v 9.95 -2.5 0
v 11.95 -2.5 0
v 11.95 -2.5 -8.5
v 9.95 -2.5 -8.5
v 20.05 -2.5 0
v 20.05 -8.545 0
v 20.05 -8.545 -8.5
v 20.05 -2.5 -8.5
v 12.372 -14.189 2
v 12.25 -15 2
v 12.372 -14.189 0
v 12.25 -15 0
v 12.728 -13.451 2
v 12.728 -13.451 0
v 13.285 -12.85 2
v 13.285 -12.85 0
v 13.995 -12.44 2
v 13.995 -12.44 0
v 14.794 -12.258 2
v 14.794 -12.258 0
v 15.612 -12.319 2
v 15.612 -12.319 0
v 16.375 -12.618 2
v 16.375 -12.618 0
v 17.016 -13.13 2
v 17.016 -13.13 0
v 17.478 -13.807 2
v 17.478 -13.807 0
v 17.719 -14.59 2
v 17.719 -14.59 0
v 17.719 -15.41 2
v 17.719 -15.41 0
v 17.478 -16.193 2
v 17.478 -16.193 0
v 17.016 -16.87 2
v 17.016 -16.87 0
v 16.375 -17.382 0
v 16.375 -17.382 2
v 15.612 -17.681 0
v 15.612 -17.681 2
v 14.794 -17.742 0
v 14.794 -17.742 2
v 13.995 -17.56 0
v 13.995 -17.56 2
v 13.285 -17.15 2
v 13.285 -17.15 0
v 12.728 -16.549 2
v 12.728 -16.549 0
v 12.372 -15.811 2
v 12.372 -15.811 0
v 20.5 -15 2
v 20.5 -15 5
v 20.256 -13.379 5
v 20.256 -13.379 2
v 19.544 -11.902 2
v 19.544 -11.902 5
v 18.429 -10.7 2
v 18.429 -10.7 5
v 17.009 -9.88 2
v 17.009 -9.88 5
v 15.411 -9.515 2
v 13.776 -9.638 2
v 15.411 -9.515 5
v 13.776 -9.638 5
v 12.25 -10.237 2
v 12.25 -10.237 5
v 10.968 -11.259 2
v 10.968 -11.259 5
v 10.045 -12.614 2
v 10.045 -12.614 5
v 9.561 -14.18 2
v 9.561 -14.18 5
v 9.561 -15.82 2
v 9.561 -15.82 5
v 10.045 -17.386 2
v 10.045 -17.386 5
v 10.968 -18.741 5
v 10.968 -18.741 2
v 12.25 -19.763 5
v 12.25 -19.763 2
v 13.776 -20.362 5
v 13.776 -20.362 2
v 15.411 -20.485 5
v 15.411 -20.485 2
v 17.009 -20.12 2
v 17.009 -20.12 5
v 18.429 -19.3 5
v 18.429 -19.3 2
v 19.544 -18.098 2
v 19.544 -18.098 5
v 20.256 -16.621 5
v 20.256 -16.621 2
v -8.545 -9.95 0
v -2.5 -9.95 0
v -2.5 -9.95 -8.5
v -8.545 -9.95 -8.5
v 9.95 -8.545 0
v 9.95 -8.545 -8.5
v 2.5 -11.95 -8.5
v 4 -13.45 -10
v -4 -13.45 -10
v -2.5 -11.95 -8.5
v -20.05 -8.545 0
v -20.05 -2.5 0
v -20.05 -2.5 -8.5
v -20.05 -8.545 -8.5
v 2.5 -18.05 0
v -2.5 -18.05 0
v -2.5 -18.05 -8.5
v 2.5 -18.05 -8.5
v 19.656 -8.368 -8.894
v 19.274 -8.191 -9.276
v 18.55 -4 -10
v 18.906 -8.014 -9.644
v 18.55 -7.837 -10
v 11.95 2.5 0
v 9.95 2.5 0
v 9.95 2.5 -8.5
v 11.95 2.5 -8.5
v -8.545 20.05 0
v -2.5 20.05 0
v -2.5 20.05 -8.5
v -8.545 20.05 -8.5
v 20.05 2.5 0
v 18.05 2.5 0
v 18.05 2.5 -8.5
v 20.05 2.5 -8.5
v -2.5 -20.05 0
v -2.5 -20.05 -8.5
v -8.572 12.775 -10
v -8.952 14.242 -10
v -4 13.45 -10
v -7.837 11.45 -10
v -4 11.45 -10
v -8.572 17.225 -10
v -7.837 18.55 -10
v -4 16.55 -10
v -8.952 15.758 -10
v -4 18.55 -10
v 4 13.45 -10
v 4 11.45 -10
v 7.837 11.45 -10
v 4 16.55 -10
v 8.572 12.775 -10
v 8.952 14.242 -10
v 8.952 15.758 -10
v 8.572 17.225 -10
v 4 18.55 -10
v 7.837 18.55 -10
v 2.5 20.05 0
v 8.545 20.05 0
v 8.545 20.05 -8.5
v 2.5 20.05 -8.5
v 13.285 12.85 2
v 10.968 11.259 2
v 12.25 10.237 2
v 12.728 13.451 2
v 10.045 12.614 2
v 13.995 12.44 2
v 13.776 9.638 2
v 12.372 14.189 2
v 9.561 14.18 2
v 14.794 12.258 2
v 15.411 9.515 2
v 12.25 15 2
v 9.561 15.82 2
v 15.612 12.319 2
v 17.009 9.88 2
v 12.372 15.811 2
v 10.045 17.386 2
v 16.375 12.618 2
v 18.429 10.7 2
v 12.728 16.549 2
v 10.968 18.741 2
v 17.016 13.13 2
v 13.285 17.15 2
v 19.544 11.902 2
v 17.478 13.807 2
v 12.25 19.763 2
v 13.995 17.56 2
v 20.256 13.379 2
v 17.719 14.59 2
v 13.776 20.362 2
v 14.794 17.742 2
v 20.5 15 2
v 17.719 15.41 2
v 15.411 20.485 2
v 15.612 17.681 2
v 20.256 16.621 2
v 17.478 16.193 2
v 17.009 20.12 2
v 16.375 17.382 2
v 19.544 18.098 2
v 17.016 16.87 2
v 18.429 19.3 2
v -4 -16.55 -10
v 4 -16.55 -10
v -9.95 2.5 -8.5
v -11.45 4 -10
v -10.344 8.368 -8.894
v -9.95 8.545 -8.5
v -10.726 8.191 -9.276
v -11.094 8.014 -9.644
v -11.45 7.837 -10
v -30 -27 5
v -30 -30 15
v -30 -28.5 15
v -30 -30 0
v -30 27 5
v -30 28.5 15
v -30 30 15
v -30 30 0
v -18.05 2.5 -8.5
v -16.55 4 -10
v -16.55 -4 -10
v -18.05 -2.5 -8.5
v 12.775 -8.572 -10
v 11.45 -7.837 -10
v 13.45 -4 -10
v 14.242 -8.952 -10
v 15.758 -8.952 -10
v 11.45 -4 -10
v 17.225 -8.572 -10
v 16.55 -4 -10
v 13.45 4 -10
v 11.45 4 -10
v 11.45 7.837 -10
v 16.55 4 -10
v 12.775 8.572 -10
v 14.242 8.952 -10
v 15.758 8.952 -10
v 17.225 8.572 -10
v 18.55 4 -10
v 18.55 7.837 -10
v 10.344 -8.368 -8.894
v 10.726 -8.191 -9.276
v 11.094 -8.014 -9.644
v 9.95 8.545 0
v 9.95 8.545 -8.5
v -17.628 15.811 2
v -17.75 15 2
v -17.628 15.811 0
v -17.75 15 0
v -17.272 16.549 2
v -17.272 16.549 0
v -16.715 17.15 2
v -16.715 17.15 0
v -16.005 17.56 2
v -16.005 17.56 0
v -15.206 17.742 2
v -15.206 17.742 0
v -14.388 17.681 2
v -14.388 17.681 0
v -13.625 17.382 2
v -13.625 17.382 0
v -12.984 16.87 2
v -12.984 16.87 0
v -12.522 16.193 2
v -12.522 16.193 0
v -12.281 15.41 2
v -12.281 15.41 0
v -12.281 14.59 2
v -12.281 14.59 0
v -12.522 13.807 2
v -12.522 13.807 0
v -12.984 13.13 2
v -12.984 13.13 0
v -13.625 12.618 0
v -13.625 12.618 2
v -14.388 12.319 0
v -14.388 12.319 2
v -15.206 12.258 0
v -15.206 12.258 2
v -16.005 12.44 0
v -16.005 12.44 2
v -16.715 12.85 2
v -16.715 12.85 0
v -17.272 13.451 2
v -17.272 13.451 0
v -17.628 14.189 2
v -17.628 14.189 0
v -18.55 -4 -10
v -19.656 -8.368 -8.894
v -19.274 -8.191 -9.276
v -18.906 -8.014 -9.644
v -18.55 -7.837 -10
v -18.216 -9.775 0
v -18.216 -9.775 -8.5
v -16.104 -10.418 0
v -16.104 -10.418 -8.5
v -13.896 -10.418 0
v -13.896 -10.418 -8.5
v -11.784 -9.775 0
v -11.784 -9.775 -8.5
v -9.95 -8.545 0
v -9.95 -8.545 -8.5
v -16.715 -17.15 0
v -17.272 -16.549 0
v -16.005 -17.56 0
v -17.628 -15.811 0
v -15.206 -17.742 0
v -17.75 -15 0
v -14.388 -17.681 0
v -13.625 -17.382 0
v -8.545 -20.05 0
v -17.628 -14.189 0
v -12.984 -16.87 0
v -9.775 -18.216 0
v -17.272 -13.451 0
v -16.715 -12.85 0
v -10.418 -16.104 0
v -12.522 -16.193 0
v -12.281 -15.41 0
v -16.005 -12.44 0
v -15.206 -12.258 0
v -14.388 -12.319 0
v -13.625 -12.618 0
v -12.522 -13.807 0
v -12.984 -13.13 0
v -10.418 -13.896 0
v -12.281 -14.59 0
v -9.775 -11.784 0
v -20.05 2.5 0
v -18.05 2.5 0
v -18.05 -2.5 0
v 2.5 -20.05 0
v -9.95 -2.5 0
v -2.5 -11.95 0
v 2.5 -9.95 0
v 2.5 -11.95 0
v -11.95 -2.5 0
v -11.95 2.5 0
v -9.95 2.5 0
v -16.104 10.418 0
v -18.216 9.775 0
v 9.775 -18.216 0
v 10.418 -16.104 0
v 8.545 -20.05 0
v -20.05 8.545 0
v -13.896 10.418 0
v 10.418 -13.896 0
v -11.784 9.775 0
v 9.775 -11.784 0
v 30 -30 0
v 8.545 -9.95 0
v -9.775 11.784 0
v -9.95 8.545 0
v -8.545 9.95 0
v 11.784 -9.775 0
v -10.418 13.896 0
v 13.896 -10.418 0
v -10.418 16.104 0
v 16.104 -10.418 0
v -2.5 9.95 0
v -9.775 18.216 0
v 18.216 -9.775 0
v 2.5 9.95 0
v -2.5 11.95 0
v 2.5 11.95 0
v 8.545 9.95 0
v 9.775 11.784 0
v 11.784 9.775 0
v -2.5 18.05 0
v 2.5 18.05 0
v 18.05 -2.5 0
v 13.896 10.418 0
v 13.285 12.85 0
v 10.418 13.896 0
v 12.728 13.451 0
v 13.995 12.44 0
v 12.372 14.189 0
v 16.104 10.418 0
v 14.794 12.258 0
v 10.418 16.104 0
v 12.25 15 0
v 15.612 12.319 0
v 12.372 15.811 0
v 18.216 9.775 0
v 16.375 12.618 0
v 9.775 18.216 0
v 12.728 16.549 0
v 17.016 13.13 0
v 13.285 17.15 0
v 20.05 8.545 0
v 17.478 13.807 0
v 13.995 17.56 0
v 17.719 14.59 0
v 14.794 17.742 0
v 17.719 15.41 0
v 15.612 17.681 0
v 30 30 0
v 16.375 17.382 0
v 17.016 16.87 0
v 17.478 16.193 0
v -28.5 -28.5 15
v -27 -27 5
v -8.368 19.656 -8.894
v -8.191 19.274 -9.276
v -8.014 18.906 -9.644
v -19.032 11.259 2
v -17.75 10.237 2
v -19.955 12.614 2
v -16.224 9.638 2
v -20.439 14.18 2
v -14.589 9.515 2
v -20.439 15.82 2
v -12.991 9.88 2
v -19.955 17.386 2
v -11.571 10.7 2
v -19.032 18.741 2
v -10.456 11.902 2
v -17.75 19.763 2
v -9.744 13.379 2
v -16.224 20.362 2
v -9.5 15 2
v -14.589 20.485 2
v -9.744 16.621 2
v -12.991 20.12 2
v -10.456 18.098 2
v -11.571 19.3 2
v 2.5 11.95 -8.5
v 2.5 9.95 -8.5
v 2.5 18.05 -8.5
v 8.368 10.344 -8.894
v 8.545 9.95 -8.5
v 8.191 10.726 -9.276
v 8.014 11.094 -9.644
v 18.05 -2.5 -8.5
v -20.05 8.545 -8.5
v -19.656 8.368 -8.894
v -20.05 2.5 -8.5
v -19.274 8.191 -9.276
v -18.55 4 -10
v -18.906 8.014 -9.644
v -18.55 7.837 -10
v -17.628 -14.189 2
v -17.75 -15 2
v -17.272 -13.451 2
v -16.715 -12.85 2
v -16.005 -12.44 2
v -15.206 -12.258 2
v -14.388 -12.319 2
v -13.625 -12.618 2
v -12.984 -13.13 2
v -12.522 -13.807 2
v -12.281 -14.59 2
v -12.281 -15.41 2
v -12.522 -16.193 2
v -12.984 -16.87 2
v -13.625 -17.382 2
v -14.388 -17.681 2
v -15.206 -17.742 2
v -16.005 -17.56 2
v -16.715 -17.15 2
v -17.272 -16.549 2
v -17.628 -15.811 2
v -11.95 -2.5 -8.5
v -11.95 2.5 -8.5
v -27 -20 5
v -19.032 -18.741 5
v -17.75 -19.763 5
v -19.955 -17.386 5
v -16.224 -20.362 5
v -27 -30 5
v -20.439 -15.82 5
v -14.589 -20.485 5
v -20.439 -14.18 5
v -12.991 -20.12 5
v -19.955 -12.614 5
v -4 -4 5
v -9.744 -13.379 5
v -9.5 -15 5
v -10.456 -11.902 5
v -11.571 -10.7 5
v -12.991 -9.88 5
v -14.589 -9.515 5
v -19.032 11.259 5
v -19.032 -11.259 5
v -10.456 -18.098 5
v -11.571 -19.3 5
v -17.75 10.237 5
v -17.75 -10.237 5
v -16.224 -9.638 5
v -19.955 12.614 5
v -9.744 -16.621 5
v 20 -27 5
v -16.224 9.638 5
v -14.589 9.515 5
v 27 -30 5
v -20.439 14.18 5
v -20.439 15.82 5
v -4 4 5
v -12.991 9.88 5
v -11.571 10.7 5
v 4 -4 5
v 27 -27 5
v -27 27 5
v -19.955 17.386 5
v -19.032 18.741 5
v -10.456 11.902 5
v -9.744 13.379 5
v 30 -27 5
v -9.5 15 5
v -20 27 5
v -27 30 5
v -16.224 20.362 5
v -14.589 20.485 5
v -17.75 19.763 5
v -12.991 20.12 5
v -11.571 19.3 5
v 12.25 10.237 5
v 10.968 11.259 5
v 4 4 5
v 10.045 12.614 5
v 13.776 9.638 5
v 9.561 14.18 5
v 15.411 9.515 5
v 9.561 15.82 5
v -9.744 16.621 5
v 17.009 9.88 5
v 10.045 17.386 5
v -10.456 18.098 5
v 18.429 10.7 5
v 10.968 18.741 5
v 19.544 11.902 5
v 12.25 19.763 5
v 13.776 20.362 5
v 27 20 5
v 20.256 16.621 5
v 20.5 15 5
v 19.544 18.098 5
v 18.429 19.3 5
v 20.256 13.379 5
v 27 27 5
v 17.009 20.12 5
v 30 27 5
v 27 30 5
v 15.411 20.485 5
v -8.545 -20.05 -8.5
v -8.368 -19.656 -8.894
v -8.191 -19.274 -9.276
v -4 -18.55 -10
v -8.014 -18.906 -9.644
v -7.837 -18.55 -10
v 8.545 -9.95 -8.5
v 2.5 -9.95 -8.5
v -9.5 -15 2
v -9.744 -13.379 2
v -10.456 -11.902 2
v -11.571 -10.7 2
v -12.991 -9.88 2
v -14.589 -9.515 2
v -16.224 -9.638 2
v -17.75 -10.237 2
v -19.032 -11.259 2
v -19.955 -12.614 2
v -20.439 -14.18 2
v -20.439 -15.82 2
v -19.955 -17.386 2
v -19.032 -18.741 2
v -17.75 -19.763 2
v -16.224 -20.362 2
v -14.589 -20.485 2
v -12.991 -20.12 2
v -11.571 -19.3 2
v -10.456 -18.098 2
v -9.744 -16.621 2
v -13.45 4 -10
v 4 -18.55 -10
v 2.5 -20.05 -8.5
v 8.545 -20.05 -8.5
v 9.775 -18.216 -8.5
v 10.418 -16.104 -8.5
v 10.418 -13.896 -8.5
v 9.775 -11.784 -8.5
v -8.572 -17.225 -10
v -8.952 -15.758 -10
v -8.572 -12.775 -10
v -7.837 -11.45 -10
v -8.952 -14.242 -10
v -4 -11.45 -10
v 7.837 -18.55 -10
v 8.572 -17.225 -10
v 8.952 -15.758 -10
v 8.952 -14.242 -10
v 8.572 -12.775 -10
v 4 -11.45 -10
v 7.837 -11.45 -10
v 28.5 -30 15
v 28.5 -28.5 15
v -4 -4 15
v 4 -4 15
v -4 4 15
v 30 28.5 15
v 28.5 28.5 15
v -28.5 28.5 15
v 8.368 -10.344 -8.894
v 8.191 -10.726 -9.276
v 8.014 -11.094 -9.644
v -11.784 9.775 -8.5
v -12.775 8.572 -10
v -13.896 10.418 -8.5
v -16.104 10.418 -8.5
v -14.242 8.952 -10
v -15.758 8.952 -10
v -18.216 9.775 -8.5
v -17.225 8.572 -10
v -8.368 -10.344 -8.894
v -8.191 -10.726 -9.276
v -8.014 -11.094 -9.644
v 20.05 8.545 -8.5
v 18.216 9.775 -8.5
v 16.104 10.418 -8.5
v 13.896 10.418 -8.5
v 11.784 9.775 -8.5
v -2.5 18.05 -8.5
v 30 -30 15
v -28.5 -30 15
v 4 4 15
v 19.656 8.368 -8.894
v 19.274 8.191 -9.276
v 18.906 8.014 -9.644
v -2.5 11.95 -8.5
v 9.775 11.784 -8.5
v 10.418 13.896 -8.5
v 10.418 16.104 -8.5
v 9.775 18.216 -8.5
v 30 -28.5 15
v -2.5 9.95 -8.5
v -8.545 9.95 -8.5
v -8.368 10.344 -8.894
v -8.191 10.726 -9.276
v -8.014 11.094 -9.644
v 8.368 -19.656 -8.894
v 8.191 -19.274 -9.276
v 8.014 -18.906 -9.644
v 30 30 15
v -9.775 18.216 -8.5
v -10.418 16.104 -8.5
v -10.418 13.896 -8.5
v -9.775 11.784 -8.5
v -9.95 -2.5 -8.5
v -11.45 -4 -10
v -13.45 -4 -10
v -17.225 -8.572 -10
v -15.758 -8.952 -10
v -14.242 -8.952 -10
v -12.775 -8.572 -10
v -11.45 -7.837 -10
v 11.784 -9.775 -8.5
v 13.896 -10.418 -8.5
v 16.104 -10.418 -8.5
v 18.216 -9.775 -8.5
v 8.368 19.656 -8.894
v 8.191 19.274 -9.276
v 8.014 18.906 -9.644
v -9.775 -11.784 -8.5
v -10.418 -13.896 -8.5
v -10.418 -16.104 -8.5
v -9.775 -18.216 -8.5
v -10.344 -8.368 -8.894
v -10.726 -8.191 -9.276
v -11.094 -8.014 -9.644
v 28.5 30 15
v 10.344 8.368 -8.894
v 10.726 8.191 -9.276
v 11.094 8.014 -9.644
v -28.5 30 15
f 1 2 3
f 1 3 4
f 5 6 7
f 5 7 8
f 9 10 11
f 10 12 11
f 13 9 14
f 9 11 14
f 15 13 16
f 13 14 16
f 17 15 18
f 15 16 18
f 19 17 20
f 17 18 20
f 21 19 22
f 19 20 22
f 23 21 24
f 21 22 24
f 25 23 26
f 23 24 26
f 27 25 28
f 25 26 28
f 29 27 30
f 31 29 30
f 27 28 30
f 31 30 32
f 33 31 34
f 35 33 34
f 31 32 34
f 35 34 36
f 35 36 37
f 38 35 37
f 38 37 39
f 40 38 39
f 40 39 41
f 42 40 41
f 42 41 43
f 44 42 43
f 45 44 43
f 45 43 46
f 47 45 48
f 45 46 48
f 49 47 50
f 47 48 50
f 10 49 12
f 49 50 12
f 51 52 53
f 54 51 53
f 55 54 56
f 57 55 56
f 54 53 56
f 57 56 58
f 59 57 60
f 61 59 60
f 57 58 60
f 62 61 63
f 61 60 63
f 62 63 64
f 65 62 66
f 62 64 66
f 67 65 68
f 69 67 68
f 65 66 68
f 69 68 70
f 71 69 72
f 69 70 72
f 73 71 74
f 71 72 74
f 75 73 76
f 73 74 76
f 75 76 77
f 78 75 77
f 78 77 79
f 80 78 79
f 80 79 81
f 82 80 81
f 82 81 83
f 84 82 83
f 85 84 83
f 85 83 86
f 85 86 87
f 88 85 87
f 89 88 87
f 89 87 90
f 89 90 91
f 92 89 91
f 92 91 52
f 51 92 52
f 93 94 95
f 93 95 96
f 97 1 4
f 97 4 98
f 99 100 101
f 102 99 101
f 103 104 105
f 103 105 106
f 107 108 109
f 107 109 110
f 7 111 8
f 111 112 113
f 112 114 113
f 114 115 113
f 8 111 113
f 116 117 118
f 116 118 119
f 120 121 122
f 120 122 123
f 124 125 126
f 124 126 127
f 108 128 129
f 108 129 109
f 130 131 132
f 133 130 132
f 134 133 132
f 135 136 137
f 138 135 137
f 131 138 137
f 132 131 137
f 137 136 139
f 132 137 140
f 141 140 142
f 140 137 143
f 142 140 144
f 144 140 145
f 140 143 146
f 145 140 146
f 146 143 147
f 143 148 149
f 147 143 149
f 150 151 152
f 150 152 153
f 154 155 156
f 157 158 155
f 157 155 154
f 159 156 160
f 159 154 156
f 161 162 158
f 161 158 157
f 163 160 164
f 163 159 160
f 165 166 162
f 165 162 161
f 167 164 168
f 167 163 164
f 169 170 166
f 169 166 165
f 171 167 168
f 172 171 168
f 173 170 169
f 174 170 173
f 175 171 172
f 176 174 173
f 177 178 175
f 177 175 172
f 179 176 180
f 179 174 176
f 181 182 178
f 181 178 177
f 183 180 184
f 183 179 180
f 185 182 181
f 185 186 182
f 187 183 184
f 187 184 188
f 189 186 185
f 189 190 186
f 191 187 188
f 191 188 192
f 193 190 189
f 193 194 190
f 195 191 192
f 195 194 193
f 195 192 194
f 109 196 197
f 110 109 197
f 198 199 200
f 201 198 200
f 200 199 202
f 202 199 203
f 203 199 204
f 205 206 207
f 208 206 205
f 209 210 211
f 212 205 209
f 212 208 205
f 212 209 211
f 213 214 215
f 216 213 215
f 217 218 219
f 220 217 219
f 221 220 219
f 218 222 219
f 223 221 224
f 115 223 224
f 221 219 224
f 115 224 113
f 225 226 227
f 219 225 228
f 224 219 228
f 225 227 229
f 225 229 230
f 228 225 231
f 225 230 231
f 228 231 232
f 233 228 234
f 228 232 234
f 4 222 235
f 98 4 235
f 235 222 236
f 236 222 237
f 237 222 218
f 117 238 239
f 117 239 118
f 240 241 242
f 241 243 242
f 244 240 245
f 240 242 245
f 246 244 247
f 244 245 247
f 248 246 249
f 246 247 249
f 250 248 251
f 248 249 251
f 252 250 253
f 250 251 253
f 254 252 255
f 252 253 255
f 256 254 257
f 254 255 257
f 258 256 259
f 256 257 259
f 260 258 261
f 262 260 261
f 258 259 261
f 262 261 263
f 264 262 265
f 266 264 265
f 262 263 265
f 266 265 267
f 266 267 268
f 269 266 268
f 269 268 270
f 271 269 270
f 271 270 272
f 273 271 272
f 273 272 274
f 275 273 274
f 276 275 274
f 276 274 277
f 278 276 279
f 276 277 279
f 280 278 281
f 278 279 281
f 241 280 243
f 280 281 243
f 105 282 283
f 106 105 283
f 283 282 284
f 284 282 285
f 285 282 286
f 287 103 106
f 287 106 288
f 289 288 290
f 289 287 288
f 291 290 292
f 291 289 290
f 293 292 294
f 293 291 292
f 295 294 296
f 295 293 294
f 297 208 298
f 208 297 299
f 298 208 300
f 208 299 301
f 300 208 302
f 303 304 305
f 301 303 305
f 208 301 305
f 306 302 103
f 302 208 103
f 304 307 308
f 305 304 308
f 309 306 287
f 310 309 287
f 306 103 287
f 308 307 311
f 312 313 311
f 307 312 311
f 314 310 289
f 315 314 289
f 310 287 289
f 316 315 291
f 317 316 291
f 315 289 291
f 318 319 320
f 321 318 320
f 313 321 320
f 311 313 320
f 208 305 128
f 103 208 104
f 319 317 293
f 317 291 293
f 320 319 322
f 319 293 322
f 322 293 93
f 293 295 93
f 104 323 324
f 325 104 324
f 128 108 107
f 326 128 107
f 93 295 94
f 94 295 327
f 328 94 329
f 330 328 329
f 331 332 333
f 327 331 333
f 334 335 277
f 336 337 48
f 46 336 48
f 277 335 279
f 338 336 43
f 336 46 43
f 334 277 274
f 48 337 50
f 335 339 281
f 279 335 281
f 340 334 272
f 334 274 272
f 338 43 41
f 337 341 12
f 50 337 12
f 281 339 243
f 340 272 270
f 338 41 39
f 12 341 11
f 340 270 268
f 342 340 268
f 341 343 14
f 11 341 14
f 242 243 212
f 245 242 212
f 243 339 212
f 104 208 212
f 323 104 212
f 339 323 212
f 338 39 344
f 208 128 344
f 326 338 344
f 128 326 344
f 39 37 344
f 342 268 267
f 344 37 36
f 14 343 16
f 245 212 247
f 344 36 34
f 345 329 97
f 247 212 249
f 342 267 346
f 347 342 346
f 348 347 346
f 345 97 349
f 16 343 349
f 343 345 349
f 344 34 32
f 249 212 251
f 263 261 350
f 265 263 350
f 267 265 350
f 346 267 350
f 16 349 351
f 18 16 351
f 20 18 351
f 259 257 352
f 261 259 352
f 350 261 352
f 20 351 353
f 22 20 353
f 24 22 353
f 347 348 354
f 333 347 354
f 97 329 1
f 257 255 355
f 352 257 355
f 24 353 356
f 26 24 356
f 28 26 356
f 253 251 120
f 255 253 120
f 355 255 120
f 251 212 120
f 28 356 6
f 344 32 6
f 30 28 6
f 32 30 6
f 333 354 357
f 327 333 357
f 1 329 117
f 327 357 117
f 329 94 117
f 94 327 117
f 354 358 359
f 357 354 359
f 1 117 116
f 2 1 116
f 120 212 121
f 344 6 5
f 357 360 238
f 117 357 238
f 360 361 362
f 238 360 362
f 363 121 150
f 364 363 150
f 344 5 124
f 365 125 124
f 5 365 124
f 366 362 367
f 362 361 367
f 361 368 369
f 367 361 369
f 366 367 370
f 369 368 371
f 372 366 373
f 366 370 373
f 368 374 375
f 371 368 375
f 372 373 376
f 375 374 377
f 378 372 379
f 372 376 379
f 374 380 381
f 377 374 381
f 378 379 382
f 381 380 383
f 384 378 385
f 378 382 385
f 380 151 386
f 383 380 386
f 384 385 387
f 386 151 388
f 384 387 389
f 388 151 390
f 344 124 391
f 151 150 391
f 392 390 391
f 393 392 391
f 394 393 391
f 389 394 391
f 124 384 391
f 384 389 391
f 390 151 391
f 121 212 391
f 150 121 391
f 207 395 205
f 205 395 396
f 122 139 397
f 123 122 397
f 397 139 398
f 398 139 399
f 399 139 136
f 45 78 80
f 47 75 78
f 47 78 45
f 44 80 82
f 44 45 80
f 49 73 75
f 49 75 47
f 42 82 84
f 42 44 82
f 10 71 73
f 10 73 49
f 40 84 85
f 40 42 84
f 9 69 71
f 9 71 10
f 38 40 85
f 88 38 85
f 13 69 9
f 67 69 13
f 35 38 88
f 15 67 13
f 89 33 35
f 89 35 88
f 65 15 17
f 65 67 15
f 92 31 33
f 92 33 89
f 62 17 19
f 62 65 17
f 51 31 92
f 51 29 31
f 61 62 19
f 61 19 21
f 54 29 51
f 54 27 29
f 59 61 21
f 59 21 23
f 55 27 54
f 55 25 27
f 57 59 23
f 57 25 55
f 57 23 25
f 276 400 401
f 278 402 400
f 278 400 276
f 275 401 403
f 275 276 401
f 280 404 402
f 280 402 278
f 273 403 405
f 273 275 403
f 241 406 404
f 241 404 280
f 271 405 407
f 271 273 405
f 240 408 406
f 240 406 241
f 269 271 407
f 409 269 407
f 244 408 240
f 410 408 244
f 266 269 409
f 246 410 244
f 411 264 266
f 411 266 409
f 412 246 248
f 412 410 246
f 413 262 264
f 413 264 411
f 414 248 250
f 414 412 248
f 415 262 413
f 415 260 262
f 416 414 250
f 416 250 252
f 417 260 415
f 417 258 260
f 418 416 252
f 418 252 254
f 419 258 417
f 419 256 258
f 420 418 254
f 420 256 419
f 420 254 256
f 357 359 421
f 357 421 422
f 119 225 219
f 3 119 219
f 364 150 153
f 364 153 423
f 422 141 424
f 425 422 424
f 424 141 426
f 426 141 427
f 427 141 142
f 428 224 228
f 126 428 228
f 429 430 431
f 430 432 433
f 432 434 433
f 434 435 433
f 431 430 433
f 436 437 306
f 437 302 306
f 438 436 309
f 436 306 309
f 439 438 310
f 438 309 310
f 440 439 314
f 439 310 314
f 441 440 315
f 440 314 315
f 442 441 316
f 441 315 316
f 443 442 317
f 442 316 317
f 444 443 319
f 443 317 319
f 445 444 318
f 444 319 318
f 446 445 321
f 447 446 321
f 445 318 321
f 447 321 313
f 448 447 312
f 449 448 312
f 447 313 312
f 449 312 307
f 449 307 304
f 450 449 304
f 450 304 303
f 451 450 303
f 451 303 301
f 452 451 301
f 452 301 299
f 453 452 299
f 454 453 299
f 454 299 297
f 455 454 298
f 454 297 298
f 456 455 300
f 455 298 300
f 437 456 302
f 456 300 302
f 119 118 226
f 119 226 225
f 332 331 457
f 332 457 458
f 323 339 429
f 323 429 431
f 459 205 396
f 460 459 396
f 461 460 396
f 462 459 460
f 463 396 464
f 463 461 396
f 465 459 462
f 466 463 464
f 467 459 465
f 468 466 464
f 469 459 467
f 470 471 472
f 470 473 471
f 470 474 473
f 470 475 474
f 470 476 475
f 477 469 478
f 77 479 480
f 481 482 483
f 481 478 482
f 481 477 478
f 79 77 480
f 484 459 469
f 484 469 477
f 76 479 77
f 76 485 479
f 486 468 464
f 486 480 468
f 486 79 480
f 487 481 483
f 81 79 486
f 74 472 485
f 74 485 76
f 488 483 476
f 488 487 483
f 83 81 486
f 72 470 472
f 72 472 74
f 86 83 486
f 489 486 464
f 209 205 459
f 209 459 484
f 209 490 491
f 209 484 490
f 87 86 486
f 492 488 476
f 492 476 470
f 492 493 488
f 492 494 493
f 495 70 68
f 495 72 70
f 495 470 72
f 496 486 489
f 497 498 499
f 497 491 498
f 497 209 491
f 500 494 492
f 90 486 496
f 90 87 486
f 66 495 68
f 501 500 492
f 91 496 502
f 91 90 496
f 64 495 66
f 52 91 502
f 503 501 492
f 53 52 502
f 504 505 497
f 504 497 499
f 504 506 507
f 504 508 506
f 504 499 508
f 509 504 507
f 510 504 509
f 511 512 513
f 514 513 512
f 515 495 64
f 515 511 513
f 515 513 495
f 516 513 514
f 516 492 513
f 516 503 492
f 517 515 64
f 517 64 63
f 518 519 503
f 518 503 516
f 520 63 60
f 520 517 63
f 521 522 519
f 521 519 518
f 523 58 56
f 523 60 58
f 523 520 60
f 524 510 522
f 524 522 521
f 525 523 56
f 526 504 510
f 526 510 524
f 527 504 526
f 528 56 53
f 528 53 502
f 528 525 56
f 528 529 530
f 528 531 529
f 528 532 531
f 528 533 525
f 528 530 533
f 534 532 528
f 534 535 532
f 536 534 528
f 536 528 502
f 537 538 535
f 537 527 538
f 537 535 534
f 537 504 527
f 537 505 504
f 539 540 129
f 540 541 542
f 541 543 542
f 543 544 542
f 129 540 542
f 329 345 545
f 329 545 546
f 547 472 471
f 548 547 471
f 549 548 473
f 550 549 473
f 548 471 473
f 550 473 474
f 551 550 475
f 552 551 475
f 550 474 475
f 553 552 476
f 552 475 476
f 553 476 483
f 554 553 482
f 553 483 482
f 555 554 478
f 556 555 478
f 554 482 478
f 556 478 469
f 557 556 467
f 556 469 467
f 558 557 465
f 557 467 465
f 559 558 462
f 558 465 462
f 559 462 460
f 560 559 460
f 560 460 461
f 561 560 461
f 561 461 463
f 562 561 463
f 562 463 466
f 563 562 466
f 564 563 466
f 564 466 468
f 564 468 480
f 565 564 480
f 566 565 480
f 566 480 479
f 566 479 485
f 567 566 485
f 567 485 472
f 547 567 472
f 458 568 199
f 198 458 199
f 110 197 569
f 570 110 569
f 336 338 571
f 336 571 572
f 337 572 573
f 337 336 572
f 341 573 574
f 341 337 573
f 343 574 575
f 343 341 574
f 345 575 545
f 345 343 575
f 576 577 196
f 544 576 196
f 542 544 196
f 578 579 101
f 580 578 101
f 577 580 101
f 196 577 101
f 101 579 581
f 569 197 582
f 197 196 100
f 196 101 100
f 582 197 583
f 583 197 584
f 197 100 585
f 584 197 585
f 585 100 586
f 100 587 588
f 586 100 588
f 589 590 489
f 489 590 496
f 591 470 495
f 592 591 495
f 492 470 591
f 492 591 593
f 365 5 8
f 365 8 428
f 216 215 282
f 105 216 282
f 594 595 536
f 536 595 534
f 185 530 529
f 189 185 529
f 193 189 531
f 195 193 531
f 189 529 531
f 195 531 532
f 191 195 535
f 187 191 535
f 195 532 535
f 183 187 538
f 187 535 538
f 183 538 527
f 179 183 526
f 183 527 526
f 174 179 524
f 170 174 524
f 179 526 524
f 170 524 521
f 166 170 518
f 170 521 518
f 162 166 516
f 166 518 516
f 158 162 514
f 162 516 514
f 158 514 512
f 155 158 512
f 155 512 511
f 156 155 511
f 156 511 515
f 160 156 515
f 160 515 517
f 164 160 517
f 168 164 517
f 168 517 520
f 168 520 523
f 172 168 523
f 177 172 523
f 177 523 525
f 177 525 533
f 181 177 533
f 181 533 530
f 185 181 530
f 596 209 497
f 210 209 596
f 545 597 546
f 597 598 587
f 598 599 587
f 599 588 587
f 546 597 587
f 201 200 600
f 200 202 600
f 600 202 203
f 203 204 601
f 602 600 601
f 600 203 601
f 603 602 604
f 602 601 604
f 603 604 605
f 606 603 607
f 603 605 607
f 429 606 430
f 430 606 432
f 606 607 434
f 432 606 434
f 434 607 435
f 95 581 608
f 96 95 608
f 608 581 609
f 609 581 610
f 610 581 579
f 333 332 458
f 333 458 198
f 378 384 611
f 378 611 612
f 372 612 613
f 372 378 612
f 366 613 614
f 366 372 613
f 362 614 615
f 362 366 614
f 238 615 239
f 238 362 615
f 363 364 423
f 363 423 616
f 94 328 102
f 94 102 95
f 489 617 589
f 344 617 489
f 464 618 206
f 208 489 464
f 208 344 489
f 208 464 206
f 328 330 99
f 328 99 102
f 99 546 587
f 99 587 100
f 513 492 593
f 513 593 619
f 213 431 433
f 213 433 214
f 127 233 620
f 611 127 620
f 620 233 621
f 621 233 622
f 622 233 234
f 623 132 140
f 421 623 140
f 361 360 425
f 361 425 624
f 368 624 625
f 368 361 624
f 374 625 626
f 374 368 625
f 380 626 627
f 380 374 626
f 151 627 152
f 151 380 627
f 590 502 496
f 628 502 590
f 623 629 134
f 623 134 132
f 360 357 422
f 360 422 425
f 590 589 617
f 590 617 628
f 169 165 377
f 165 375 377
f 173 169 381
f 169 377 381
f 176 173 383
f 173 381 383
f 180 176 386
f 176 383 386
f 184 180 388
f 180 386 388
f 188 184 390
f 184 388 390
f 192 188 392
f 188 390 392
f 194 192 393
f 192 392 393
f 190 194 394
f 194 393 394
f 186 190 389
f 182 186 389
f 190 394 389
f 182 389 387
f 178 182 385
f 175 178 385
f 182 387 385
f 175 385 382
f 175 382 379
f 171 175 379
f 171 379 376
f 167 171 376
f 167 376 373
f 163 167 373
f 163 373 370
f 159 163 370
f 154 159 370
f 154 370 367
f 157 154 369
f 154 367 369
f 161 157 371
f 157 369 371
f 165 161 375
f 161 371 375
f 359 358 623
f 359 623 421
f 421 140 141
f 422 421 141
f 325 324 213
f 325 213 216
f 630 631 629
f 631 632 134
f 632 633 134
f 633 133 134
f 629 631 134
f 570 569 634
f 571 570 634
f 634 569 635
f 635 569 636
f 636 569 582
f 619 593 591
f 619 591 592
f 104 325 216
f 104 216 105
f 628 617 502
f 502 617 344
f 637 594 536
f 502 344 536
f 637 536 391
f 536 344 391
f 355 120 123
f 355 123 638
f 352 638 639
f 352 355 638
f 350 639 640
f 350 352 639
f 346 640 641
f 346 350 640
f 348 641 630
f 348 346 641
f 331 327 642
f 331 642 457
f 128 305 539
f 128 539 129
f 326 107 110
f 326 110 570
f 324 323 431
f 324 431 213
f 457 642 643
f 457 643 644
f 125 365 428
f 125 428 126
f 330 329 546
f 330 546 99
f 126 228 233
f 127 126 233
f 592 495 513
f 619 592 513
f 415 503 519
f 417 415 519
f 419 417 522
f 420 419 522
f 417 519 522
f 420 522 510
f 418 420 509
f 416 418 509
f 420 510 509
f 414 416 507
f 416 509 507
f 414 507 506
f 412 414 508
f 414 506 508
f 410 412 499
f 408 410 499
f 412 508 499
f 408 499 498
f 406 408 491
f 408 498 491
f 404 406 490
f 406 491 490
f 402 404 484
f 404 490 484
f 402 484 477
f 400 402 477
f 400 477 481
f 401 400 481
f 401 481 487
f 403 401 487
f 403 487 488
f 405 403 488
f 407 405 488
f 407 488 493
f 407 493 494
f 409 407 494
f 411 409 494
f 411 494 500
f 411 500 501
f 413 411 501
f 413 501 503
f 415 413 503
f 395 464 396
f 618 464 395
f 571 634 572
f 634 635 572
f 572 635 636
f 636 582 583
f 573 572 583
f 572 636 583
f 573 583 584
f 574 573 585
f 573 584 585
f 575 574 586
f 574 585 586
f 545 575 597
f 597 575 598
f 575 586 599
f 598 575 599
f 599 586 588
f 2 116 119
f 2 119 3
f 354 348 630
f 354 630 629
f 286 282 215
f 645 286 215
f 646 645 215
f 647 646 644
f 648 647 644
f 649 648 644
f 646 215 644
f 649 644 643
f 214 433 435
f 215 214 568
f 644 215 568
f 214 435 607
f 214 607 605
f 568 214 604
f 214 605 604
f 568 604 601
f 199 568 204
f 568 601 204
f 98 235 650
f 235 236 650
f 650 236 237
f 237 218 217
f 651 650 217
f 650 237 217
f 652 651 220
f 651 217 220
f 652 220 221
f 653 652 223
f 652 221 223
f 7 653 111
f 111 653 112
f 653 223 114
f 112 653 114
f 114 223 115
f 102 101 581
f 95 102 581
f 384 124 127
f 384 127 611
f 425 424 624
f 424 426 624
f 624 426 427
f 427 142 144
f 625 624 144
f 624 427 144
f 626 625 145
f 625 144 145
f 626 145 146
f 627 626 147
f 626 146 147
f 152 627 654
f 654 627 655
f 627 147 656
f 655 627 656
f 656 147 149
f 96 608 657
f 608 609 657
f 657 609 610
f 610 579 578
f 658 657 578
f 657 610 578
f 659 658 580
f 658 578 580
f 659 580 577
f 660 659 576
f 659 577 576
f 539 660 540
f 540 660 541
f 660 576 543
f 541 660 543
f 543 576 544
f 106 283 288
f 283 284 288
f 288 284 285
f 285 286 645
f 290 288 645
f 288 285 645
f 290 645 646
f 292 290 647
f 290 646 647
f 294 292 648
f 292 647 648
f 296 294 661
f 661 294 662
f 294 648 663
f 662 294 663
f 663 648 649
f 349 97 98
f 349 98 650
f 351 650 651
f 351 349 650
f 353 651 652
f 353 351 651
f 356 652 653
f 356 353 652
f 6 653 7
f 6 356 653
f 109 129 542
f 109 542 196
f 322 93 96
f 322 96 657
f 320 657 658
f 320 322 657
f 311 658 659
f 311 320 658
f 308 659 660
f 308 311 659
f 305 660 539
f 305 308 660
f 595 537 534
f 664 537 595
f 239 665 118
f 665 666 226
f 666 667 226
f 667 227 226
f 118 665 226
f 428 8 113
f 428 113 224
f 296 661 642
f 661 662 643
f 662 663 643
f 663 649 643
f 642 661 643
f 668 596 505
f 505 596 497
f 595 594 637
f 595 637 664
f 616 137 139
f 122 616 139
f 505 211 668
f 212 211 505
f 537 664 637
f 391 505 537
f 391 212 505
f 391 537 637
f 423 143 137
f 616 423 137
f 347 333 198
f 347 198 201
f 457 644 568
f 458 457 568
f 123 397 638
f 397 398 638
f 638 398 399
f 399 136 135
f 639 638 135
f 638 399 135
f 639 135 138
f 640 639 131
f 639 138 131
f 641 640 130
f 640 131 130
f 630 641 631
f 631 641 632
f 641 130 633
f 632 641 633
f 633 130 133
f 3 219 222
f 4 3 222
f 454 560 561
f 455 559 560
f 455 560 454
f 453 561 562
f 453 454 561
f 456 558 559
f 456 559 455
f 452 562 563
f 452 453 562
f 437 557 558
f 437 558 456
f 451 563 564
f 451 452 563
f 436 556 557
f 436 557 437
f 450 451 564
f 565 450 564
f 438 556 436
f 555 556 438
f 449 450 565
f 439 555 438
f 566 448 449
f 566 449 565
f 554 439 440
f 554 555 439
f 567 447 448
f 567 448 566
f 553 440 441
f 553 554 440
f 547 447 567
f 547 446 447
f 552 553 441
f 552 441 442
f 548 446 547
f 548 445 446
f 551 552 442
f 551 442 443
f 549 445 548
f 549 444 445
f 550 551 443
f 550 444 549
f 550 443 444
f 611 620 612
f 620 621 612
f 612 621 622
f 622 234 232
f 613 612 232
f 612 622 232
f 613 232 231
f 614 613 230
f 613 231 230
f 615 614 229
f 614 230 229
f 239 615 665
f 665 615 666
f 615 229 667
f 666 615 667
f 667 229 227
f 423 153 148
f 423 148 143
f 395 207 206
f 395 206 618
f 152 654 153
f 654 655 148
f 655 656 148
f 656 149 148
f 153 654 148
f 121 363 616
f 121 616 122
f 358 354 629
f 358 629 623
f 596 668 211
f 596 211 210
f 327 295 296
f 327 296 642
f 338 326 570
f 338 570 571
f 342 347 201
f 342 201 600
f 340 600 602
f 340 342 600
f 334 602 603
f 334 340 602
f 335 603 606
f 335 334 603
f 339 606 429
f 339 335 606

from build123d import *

# Parameters (mm, degrees)
SKETCH_1_W                   = 60
SKETCH_1_H                   = 60
EXTRUDE_1_DEPTH              = 5
SKETCH_3_W                   = 3
SKETCH_3_H                   = 3
EXTRUDE_3_DEPTH              = 10
CUT_EXTRUDE_1_DEPTH          = 67.136223055
CUT_EXTRUDE_2_DEPTH          = 10
PATTERN_CIRCULAR_1_COUNT     = 4
HOLE_WIZARD_M5_2_D           = 5.5
HOLE_WIZARD_M5_2_CBORE_D     = 11
HOLE_WIZARD_M5_2_CBORE_DEPTH = 3
EXTRUDE_4_DEPTH              = 10
CHAMFER_1_SIZE               = 1.5
SKETCH_10_W                  = 8
SKETCH_10_H                  = 8
EXTRUDE_5_DEPTH              = 10


with BuildPart() as part:
    # 스케치1 → 보스-돌출1 (new body)
    with BuildSketch(Plane.XY):
        Rectangle(SKETCH_1_W, SKETCH_1_H)
    extrude(amount=EXTRUDE_1_DEPTH)

    # 스케치3 → 보스-돌출3 (add)
    with BuildSketch(Plane.XY.offset(5)):
        with Locations((-28.5, -28.5)):
            Rectangle(SKETCH_3_W, SKETCH_3_H)
    extrude_3 = extrude(amount=EXTRUDE_3_DEPTH)

    # 스케치4 → 컷-돌출1 (cut, through all)
    with BuildSketch(Plane(origin=(-27, 0, 0), x_dir=(0, 0, -1), z_dir=(1, 0, 0))):
        Polygon((-15, -27), (-15, -28.5), (-5, -27), align=None)
    cut_extrude_1 = extrude(amount=-CUT_EXTRUDE_1_DEPTH, mode=Mode.SUBTRACT)

    # 스케치5 → 컷-돌출2 (cut)
    with BuildSketch(Plane.XZ.offset(30)):
        Polygon((-28.5, 15), (-27, 15), (-27, 5), align=None)
    cut_extrude_2 = extrude(amount=-CUT_EXTRUDE_2_DEPTH, mode=Mode.SUBTRACT)

    # 원형 패턴1: 보스-돌출3, 컷-돌출1, 컷-돌출2 ×4 about axis
    pattern_circular_1_axis = Axis((0, 0, 0), (0, 0, 1))
    add([extrude_3.rotate(pattern_circular_1_axis, i * 360 / PATTERN_CIRCULAR_1_COUNT) for i in range(1, PATTERN_CIRCULAR_1_COUNT)])
    add([cut_extrude_1.rotate(pattern_circular_1_axis, i * 360 / PATTERN_CIRCULAR_1_COUNT) for i in range(1, PATTERN_CIRCULAR_1_COUNT)], mode=Mode.SUBTRACT)
    add([cut_extrude_2.rotate(pattern_circular_1_axis, i * 360 / PATTERN_CIRCULAR_1_COUNT) for i in range(1, PATTERN_CIRCULAR_1_COUNT)], mode=Mode.SUBTRACT)

    # M5 소켓 머리 캡 나사용 카운터보어2 (through all)
    with Locations(Plane.XY.offset(5)):
        with Locations((-15, 15), (15, 15), (15, -15), (-15, -15)):
            CounterBoreHole(HOLE_WIZARD_M5_2_D / 2, HOLE_WIZARD_M5_2_CBORE_D / 2, HOLE_WIZARD_M5_2_CBORE_DEPTH)

    # 스케치9 → 보스-돌출4 (add)
    with BuildSketch(Plane(origin=(0, 0, 0), x_dir=(-1, 0, 0), z_dir=(0, 0, -1))):
        with BuildLine():
            Line((-20.05, 2.5), (-20.05, 8.545042831))
            ThreePointArc((-20.05, 8.545042831), (-15, 10.5), (-9.95, 8.545042831))
            Line((-9.95, 8.545042831), (-9.95, 2.5))
            Line((-9.95, 2.5), (-11.95, 2.5))
            Line((-11.95, 2.5), (-11.95, -2.5))
            Line((-11.95, -2.5), (-9.95, -2.5))
            Line((-9.95, -2.5), (-9.95, -8.545042831))
            ThreePointArc((-9.95, -8.545042831), (-15, -10.5), (-20.05, -8.545042831))
            Line((-20.05, -8.545042831), (-20.05, -2.5))
            Line((-20.05, -2.5), (-18.05, -2.5))
            Line((-18.05, -2.5), (-18.05, 2.5))
            Line((-18.05, 2.5), (-20.05, 2.5))
        make_face()
        with BuildLine():
            Line((2.5, 20.05), (8.545042831, 20.05))
            ThreePointArc((8.545042831, 20.05), (10.5, 15), (8.545042831, 9.95))
            Line((8.545042831, 9.95), (2.5, 9.95))
            Line((2.5, 9.95), (2.5, 11.95))
            Line((2.5, 11.95), (-2.5, 11.95))
            Line((-2.5, 11.95), (-2.5, 9.95))
            Line((-2.5, 9.95), (-8.545042831, 9.95))
            ThreePointArc((-8.545042831, 9.95), (-10.5, 15), (-8.545042831, 20.05))
            Line((-8.545042831, 20.05), (-2.5, 20.05))
            Line((-2.5, 20.05), (-2.5, 18.05))
            Line((-2.5, 18.05), (2.5, 18.05))
            Line((2.5, 18.05), (2.5, 20.05))
        make_face()
        with BuildLine():
            Line((20.05, -2.5), (20.05, -8.545042831))
            ThreePointArc((20.05, -8.545042831), (15, -10.5), (9.95, -8.545042831))
            Line((9.95, -8.545042831), (9.95, -2.5))
            Line((9.95, -2.5), (11.95, -2.5))
            Line((11.95, -2.5), (11.95, 2.5))
            Line((11.95, 2.5), (9.95, 2.5))
            Line((9.95, 2.5), (9.95, 8.545042831))
            ThreePointArc((9.95, 8.545042831), (15, 10.5), (20.05, 8.545042831))
            Line((20.05, 8.545042831), (20.05, 2.5))
            Line((20.05, 2.5), (18.05, 2.5))
            Line((18.05, 2.5), (18.05, -2.5))
            Line((18.05, -2.5), (20.05, -2.5))
        make_face()
        with BuildLine():
            Line((-2.5, -20.05), (-8.545042831, -20.05))
            ThreePointArc((-8.545042831, -20.05), (-10.5, -15), (-8.545042831, -9.95))
            Line((-8.545042831, -9.95), (-2.5, -9.95))
            Line((-2.5, -9.95), (-2.5, -11.95))
            Line((-2.5, -11.95), (2.5, -11.95))
            Line((2.5, -11.95), (2.5, -9.95))
            Line((2.5, -9.95), (8.545042831, -9.95))
            ThreePointArc((8.545042831, -9.95), (10.5, -15), (8.545042831, -20.05))
            Line((8.545042831, -20.05), (2.5, -20.05))
            Line((2.5, -20.05), (2.5, -18.05))
            Line((2.5, -18.05), (-2.5, -18.05))
            Line((-2.5, -18.05), (-2.5, -20.05))
        make_face()
    extrude(amount=EXTRUDE_4_DEPTH)

    # 모따기1
    chamfer_1_edges = [part.edges().sort_by_distance(p)[0] for p in [
        (15, -10.5, -10),
        (9.95, -5.522521416, -10),
        (10.95, -2.5, -10),
        (11.95, 0, -10),
        (10.95, 2.5, -10),
        (9.95, 5.522521416, -10),
        (15, 10.5, -10),
        (20.05, 5.522521416, -10),
        (19.05, 2.5, -10),
        (18.05, 0, -10),
        (19.05, -2.5, -10),
        (20.05, -5.522521416, -10),
        (10.5, 15, -10),
        (5.522521416, 9.95, -10),
        (2.5, 10.95, -10),
        (0, 11.95, -10),
        (-2.5, 10.95, -10),
        (-5.522521416, 9.95, -10),
        (-10.5, 15, -10),
        (-5.522521416, 20.05, -10),
        (-2.5, 19.05, -10),
        (0, 18.05, -10),
        (2.5, 19.05, -10),
        (5.522521416, 20.05, -10),
        (-15, 10.5, -10),
        (-9.95, 5.522521416, -10),
        (-10.95, 2.5, -10),
        (-11.95, 0, -10),
        (-10.95, -2.5, -10),
        (-9.95, -5.522521416, -10),
        (-15, -10.5, -10),
        (-20.05, -5.522521416, -10),
        (-19.05, -2.5, -10),
        (-18.05, 0, -10),
        (-19.05, 2.5, -10),
        (-20.05, 5.522521416, -10),
        (-10.5, -15, -10),
        (-5.522521416, -9.95, -10),
        (-2.5, -10.95, -10),
        (0, -11.95, -10),
        (2.5, -10.95, -10),
        (5.522521416, -9.95, -10),
        (10.5, -15, -10),
        (5.522521416, -20.05, -10),
        (2.5, -19.05, -10),
        (0, -18.05, -10),
        (-2.5, -19.05, -10),
        (-5.522521416, -20.05, -10),
    ]]
    chamfer(chamfer_1_edges, length=CHAMFER_1_SIZE)

    # 스케치10 → 보스-돌출5 (add)
    with BuildSketch(Plane.XY.offset(5)):
        Rectangle(SKETCH_10_W, SKETCH_10_H)
    extrude(amount=EXTRUDE_5_DEPTH)


solid = part.part
